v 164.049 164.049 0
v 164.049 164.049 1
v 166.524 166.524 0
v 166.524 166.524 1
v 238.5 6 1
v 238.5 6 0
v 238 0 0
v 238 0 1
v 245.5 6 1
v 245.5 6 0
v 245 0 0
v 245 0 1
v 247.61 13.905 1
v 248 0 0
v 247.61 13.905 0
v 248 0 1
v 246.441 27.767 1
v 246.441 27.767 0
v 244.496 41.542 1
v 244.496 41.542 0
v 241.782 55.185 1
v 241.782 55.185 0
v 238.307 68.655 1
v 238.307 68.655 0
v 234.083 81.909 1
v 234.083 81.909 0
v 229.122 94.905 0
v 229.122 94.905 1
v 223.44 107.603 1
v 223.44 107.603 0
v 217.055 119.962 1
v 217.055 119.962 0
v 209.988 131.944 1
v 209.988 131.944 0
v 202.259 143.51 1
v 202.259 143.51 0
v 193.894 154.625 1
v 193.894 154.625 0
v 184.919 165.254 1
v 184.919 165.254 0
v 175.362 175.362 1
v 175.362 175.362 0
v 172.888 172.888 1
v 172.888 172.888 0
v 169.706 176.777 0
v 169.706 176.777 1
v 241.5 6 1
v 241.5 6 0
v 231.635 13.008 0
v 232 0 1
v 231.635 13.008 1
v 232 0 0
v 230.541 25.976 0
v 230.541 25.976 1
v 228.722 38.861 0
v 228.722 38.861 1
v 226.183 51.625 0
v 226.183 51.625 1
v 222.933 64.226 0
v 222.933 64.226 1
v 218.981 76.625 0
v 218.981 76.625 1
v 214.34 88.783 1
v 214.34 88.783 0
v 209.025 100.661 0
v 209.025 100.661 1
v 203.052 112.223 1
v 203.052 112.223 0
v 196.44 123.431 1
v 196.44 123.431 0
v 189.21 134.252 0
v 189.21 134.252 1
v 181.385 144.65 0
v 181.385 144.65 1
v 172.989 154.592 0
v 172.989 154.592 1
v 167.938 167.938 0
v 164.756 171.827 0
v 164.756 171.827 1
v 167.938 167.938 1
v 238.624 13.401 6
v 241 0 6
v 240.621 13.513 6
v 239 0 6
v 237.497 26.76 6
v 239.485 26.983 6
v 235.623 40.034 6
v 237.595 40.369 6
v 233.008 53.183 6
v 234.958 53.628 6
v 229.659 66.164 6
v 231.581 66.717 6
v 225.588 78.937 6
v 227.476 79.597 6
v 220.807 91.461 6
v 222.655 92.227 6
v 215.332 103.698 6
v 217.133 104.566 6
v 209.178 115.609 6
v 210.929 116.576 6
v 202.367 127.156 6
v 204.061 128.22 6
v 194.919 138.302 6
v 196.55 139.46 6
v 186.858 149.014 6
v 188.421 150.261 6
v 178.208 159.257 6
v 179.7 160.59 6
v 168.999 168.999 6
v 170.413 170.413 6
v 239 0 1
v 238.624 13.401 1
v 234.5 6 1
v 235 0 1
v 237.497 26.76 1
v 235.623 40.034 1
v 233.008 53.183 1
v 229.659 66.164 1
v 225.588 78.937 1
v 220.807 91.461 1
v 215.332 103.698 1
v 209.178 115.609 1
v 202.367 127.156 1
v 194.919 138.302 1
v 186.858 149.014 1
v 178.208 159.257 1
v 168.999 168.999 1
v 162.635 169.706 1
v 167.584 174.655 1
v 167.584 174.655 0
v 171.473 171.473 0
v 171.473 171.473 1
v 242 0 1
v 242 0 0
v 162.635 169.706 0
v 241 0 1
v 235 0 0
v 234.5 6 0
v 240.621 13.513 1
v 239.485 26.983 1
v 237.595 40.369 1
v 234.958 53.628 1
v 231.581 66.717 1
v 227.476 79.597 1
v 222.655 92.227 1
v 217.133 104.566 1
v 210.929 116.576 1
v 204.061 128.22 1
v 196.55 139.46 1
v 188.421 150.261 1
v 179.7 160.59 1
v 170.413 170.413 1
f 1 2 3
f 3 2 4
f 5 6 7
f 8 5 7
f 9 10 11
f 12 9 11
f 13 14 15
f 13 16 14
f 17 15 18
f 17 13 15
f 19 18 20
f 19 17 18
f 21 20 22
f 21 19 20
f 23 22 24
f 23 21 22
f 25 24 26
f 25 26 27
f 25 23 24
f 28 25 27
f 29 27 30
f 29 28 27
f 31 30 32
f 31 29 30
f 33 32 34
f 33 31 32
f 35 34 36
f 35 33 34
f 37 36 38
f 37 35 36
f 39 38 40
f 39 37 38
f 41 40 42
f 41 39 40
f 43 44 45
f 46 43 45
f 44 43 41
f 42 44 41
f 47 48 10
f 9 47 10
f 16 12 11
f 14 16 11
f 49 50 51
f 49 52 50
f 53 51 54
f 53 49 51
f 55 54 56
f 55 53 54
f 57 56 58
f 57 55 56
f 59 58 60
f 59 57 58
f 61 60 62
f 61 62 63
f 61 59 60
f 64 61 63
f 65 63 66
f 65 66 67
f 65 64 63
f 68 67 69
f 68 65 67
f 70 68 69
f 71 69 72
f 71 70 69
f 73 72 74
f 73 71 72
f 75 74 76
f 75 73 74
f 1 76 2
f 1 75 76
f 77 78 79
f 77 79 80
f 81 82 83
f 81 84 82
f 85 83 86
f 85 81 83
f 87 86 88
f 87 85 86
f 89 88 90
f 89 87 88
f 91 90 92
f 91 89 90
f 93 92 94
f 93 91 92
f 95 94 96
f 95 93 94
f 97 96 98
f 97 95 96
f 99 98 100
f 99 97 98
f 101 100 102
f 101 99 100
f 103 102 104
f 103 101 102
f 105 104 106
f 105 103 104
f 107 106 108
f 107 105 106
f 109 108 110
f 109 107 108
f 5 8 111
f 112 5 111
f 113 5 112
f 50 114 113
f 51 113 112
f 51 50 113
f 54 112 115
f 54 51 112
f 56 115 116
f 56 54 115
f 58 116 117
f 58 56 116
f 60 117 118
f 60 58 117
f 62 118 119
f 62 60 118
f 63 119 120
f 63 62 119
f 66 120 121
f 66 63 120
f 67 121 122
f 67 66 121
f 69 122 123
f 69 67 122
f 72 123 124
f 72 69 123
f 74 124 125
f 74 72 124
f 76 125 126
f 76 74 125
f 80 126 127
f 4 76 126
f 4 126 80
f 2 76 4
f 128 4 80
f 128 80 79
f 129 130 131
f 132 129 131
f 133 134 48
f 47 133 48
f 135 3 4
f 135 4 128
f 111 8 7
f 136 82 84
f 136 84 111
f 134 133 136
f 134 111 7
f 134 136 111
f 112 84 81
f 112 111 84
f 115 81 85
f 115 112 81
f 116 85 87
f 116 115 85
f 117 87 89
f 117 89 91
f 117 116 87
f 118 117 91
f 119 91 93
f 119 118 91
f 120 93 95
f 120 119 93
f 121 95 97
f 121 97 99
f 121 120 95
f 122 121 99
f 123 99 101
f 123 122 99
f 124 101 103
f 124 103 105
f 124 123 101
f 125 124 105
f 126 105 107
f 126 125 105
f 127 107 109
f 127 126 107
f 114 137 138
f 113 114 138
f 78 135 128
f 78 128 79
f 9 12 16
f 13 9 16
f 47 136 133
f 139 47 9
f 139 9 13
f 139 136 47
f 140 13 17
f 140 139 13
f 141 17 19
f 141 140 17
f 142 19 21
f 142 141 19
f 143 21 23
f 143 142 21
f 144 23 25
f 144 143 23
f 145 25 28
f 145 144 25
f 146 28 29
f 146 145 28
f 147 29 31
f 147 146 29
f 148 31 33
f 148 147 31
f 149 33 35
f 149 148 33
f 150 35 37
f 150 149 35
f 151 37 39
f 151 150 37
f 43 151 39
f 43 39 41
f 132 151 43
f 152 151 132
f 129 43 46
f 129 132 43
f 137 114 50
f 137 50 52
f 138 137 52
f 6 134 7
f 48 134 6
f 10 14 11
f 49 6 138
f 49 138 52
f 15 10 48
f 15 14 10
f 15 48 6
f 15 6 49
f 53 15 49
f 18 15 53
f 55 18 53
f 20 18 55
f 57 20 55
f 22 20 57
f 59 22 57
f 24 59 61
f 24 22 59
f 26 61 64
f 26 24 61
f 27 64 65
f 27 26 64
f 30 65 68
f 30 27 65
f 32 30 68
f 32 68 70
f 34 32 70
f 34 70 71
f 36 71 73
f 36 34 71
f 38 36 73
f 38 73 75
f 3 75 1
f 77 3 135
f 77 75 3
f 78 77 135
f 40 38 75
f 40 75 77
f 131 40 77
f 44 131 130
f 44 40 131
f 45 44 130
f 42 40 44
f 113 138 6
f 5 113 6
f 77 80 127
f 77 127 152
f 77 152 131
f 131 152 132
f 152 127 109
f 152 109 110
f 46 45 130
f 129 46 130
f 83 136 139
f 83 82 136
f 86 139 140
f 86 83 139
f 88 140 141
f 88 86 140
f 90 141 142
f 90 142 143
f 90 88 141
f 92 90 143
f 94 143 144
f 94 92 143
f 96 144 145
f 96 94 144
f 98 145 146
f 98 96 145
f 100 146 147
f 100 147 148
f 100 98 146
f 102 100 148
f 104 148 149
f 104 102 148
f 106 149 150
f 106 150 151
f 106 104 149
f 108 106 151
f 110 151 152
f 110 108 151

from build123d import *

# Parameters (mm, degrees)
POCKET_DEPTH      = 0.001
POCKET_DEPTH_BACK = 6.001
PAD_DEPTH         = 1


with BuildPart() as part:
    # AdditivePipe: sweep along a path in Sketch
    with BuildLine(Plane.XY) as additivepipe_path:
        ThreePointArc((240, 0), (221.731088, 91.844024), (169.705627, 169.705627))
    # Sketch001 → AdditivePipe (sweep)
    with BuildSketch(Plane(origin=(240, 0, 0), x_dir=(1, 0, 0), z_dir=(0, -1, 0))):
        Polygon((-8, 0), (8, 0), (8, 1), (1, 1), (1, 6), (-1, 6), (-1, 1), (-8, 1), align=None)
    sweep(path=additivepipe_path.line, is_frenet=True)

    # Sketch002 → Pocket (cut, two sides)
    with BuildSketch(Plane.XY) as pocket_sk:
        Polygon((235, 0), (234.5, 6), (238.5, 6), (238, 0), align=None)
        Polygon((242, 0), (241.5, 6), (245.5, 6), (245, 0), align=None)
    extrude(amount=-POCKET_DEPTH, mode=Mode.SUBTRACT)
    extrude(pocket_sk.sketch, amount=POCKET_DEPTH_BACK, mode=Mode.SUBTRACT)

    # Sketch003 → Pad (join)
    with BuildSketch(Plane.XY):
        Polygon((162.63456, 169.705627), (164.75588, 171.826948), (167.937861, 167.937861), (166.523647, 166.523647), align=None)
        Polygon((169.705627, 176.776695), (167.584307, 174.655375), (171.473394, 171.473394), (172.887608, 172.887608), align=None)
    extrude(amount=PAD_DEPTH)


solid = part.part
